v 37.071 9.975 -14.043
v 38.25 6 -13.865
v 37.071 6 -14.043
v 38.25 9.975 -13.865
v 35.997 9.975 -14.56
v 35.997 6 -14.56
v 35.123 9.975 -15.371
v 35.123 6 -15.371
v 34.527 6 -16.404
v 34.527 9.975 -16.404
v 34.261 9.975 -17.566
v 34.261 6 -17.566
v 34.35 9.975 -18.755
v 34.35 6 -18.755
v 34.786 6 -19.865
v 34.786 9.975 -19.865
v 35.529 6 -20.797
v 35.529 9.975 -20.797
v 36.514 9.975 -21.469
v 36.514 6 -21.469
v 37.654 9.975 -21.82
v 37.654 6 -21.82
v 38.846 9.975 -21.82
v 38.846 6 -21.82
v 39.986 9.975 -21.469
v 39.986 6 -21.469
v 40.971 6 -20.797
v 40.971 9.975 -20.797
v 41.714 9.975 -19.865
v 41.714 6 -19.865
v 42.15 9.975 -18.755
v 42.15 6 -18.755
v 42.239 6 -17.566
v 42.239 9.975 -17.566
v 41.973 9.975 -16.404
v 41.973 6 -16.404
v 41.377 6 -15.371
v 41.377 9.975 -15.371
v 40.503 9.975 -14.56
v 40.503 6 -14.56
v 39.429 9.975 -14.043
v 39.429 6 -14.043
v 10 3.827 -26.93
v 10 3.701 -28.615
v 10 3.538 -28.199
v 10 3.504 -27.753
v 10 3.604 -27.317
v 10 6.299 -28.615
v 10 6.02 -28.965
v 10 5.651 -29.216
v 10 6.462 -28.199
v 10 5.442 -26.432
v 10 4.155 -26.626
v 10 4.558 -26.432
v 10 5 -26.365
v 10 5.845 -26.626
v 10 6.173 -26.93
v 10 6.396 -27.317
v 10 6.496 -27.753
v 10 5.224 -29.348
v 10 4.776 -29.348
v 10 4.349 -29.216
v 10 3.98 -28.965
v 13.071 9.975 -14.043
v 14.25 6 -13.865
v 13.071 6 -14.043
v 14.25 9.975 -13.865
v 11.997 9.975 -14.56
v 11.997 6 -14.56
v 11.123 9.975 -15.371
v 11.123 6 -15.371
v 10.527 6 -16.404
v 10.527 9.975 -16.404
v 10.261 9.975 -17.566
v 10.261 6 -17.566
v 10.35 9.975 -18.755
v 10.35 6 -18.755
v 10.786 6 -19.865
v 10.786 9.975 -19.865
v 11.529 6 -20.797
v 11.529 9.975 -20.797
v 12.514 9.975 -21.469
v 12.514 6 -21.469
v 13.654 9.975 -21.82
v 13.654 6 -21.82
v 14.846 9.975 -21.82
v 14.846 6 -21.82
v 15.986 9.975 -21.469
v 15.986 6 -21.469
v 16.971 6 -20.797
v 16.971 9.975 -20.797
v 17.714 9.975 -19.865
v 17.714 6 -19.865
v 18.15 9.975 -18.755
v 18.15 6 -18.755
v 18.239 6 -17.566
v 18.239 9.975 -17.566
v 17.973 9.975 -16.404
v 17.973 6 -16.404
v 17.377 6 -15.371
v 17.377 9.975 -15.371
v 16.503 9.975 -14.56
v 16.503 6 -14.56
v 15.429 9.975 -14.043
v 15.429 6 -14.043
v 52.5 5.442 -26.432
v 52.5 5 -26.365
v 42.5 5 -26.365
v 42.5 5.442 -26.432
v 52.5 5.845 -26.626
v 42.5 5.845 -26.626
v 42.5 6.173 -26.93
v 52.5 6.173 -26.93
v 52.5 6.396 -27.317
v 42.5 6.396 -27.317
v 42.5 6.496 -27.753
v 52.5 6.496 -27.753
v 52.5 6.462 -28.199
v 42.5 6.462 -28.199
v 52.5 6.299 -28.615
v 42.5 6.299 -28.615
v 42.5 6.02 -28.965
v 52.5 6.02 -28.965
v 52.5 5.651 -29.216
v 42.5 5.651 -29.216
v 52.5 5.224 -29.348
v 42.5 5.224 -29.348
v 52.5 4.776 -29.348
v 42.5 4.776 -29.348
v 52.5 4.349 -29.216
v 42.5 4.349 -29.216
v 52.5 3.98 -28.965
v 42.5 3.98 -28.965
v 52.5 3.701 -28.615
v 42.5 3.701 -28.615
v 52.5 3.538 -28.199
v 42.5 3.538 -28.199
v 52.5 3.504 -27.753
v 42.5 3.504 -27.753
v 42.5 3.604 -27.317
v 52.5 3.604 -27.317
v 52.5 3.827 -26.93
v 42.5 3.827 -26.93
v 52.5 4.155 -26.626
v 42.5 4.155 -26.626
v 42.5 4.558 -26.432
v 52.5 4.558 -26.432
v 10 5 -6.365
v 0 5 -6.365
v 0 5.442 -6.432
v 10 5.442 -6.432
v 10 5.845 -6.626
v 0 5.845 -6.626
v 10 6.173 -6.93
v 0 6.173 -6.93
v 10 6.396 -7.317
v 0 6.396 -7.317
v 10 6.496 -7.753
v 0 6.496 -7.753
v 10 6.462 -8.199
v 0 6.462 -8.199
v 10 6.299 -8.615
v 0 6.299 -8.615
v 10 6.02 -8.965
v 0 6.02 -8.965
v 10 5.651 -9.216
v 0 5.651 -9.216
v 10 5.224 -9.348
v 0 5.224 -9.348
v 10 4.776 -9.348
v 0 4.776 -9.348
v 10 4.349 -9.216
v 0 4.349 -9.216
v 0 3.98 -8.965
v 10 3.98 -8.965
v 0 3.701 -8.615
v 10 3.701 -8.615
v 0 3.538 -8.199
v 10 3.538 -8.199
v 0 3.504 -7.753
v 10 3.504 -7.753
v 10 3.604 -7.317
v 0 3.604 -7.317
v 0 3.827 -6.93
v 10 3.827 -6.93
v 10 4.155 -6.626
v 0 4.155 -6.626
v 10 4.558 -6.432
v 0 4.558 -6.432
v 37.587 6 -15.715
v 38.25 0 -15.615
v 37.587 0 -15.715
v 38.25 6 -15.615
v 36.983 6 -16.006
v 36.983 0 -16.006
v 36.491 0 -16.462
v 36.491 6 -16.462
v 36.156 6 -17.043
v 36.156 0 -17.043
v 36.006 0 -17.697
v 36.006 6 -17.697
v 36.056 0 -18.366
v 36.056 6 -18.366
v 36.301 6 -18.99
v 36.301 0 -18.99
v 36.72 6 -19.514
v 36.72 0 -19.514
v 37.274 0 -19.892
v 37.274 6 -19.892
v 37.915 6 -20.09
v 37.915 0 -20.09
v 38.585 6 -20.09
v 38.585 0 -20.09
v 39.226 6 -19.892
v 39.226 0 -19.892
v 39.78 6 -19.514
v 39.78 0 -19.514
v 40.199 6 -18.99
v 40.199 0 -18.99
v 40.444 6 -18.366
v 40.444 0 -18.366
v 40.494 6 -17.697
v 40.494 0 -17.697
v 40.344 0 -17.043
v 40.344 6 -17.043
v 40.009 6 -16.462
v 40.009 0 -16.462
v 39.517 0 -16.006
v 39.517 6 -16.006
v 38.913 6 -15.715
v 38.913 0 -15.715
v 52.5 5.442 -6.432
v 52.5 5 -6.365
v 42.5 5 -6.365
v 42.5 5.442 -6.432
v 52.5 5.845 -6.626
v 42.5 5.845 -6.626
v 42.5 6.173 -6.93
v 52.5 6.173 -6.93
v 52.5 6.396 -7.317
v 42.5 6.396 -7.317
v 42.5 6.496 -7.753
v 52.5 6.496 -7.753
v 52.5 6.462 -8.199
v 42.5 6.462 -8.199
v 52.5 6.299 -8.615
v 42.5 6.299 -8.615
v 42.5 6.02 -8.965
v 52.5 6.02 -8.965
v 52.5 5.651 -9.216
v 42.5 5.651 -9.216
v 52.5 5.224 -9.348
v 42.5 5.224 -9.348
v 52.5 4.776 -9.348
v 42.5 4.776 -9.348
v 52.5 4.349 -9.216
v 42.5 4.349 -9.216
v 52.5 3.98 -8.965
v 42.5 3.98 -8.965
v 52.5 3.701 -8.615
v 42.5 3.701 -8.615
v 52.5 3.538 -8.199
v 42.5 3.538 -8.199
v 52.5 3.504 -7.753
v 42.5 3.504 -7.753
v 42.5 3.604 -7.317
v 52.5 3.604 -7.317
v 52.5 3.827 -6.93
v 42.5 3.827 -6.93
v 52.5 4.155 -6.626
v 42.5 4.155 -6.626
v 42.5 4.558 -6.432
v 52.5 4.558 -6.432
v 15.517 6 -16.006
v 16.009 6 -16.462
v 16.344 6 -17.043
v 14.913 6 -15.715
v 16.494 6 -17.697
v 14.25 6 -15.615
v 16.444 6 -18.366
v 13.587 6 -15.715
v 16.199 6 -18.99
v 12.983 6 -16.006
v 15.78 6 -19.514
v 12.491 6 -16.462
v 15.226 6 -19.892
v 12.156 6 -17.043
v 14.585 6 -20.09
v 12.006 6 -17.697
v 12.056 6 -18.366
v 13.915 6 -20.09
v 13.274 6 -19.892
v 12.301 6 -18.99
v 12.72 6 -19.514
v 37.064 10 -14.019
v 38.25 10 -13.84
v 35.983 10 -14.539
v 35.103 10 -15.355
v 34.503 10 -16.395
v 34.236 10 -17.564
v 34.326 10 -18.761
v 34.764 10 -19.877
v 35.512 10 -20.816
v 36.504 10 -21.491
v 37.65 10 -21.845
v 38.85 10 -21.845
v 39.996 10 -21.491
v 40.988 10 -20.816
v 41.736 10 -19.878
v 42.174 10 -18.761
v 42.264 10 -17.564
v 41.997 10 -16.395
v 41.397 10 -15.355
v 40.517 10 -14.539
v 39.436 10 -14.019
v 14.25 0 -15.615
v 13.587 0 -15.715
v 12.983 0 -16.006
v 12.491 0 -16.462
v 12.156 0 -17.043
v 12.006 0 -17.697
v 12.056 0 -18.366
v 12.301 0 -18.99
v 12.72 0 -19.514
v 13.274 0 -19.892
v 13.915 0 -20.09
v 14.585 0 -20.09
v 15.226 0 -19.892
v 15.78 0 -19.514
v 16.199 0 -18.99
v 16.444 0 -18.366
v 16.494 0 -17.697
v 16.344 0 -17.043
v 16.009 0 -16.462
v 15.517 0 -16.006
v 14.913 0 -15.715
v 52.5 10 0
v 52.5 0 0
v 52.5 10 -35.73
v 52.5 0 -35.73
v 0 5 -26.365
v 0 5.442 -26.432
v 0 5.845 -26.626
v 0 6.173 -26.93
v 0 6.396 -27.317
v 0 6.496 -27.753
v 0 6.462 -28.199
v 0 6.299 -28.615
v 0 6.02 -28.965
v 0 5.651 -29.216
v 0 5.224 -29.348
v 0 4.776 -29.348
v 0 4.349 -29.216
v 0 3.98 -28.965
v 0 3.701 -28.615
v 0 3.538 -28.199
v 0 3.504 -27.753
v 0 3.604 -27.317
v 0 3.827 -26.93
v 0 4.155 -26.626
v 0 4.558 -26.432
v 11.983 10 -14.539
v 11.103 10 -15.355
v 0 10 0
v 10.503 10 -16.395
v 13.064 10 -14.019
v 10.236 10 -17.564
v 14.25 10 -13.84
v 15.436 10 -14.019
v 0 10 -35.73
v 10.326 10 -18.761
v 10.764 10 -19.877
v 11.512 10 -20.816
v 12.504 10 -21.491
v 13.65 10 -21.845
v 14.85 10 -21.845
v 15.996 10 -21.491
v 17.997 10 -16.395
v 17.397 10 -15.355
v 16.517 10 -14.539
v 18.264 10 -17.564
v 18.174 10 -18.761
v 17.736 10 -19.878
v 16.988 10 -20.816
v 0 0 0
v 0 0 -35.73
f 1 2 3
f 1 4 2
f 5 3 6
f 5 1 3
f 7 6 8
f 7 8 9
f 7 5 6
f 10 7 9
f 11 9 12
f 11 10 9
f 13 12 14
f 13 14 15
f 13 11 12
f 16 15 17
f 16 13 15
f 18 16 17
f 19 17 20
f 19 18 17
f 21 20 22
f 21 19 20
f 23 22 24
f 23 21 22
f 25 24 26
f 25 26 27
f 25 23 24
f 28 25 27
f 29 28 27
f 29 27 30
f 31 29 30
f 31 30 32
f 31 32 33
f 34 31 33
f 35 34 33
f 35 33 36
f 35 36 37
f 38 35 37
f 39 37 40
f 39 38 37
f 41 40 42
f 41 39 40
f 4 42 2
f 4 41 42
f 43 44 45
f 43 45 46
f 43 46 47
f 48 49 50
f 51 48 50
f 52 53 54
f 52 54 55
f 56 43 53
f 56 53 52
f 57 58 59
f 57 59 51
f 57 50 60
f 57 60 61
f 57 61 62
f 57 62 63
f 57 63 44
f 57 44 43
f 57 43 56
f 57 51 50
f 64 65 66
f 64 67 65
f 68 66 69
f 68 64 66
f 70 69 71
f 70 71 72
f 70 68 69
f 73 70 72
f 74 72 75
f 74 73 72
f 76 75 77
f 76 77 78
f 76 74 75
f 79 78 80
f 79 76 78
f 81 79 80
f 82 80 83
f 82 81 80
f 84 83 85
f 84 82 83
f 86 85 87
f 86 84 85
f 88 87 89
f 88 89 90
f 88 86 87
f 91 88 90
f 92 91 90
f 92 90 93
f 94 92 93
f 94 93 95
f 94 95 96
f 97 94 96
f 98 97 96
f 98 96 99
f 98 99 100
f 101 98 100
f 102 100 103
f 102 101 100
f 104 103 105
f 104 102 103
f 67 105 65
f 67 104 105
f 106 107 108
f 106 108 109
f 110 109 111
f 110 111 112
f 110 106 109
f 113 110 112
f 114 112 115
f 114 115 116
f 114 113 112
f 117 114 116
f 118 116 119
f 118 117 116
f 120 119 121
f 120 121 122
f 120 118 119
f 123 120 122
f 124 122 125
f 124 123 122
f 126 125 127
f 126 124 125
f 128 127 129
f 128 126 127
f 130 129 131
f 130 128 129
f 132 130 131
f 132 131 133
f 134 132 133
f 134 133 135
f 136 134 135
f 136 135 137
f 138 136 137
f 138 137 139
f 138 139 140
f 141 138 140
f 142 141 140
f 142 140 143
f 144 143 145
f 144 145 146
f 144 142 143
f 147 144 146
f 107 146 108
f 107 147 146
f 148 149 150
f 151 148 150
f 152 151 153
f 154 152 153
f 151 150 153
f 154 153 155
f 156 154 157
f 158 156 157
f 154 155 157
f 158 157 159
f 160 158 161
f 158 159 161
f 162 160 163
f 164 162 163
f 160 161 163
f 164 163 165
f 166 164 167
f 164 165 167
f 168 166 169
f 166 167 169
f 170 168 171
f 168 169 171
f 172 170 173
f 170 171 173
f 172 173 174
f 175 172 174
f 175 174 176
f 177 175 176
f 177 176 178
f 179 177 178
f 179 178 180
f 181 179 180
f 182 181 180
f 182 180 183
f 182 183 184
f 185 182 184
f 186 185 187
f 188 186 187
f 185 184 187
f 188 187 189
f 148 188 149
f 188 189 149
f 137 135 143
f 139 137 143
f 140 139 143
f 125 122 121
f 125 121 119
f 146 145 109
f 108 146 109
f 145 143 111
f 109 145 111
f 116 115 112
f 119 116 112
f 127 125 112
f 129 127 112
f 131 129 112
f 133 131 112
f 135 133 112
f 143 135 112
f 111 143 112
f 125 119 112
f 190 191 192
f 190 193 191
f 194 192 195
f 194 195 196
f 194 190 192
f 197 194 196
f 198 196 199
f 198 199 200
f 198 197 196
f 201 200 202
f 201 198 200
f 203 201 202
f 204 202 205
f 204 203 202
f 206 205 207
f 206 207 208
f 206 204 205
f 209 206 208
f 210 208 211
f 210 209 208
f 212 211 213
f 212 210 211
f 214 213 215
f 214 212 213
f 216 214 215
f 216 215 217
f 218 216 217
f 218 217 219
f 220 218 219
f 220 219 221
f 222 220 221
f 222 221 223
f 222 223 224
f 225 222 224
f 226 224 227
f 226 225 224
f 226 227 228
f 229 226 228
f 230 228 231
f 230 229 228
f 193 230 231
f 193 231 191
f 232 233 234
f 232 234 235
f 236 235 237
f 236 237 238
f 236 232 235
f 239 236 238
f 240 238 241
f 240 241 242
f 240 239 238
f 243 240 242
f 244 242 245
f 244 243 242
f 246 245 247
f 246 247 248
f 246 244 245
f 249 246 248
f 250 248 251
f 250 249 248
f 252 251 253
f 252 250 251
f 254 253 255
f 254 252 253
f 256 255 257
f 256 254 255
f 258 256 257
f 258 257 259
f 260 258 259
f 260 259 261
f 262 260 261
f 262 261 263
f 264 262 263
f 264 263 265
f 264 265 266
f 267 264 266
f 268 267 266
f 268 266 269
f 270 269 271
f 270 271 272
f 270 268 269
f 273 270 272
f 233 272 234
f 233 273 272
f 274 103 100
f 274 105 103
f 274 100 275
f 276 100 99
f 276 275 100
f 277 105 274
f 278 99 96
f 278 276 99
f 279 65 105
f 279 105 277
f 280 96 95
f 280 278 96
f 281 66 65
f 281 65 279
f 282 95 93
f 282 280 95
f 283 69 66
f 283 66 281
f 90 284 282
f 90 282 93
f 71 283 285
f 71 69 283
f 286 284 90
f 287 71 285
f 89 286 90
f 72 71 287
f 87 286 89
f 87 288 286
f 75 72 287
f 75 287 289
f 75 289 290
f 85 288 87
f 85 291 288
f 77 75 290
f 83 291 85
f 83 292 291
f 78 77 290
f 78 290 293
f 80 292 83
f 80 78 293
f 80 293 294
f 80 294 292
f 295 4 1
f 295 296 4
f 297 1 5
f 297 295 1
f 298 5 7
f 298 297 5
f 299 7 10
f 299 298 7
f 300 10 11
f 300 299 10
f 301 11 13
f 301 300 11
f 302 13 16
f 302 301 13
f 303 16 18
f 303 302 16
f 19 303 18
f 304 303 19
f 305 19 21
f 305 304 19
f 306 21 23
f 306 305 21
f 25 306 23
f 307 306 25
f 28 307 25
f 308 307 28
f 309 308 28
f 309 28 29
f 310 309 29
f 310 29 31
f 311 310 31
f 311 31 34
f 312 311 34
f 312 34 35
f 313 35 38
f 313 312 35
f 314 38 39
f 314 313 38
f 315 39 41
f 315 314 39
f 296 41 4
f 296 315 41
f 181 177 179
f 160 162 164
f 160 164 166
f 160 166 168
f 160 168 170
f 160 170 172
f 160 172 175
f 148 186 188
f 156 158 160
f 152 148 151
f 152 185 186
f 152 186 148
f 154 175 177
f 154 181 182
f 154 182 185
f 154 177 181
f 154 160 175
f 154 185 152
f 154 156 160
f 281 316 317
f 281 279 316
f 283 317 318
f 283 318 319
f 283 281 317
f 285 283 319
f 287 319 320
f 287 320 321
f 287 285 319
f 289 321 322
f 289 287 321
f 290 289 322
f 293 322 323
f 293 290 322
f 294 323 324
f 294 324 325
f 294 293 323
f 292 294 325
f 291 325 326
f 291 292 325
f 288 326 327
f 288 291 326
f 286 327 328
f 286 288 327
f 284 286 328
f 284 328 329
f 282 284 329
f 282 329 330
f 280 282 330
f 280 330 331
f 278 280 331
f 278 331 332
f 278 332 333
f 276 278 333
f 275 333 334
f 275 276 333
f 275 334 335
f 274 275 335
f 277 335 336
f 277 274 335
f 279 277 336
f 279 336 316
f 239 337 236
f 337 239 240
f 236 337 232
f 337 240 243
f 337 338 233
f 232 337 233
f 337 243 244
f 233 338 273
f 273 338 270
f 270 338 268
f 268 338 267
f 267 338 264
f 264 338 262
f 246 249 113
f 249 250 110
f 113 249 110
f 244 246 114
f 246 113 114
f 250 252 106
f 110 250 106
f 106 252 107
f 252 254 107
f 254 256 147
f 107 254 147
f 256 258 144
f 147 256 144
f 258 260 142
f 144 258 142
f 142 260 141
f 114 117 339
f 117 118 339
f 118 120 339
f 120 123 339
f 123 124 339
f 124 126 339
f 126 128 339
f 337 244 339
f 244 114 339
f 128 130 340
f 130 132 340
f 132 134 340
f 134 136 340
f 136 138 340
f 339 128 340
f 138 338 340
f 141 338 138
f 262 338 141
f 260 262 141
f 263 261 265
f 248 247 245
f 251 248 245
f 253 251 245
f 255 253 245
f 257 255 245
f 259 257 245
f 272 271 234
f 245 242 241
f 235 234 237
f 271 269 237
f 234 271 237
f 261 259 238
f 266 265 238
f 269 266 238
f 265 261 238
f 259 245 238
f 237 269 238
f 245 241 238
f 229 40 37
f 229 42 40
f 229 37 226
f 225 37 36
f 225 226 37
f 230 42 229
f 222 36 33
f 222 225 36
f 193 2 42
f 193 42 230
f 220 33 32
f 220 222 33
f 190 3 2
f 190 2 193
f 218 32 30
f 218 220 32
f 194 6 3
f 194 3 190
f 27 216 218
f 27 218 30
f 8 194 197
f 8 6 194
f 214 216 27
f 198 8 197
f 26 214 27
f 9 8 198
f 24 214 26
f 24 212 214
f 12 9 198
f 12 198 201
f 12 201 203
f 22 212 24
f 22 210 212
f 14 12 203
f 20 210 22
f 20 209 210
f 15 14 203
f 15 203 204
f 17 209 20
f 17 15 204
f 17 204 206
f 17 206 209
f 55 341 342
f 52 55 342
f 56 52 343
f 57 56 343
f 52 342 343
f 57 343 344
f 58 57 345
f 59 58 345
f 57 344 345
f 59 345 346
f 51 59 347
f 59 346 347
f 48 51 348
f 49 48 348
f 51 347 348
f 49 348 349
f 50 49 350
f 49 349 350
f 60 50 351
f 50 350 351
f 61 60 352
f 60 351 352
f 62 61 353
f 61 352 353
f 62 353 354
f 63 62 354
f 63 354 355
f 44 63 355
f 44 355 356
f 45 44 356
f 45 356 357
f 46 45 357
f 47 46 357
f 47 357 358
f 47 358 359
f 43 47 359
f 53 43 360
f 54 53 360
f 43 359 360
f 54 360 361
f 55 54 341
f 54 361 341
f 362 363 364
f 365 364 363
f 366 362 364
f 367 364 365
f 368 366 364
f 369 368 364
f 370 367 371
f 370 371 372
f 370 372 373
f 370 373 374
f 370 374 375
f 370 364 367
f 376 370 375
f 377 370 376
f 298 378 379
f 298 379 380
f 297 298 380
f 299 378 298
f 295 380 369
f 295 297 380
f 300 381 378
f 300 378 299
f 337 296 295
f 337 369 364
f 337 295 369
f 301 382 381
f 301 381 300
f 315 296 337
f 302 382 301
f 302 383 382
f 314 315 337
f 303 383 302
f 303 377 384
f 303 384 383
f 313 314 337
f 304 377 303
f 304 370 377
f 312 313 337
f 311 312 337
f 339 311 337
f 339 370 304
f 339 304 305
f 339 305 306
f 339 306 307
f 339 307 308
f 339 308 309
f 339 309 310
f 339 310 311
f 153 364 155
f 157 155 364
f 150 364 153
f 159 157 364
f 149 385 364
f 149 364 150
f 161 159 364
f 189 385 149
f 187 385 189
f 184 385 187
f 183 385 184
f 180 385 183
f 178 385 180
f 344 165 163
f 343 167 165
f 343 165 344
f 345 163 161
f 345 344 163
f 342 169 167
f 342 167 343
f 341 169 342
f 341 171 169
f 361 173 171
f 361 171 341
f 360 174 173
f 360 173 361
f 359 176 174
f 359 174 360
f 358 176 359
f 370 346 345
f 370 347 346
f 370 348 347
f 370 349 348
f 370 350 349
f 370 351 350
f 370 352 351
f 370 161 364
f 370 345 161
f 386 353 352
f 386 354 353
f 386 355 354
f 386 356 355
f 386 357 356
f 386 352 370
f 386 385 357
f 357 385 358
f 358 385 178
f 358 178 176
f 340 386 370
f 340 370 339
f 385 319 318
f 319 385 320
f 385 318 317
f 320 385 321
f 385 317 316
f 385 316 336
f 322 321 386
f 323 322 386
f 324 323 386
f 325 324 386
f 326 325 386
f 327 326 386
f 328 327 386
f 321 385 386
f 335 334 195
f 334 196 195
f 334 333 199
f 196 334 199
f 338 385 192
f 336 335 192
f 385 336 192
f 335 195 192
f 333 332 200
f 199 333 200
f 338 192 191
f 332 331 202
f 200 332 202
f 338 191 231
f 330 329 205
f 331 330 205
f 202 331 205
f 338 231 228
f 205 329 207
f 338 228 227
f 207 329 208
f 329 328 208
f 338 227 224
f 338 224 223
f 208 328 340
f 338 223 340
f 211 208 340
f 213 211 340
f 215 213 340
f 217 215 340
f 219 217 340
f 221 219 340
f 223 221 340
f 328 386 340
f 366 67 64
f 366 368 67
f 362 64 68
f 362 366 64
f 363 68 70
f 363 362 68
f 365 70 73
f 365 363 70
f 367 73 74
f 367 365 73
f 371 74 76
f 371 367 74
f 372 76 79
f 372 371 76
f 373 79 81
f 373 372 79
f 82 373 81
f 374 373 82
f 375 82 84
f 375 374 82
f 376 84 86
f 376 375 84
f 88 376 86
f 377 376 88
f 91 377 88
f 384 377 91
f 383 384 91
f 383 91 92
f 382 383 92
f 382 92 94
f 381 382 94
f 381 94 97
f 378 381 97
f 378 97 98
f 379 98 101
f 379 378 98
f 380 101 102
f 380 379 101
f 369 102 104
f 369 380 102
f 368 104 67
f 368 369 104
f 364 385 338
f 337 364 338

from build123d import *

# Parameters (mm, degrees)
SKETCH1_W                     = 52.5
SKETCH1_H                     = 35.73
BOSS_EXTRUDE1_DEPTH           = 10
SKETCH3_R                     = 1.5
CUT_EXTRUDE1_DEPTH            = 10
CBORE_FOR_M4_SHCS1_AT_2_COUNT = 2
CBORE_FOR_M4_SHCS1_AT_2_PITCH = 24


with BuildPart() as part:
    # Sketch1 → Boss-Extrude1 (new body)
    with BuildSketch(Plane(origin=(0, 0, 0), x_dir=(1, 0, 0), z_dir=(0, 1, 0))):
        with Locations((26.25, 17.865)):
            Rectangle(SKETCH1_W, SKETCH1_H)
    extrude(amount=BOSS_EXTRUDE1_DEPTH)

    # Sketch3 → Cut-Extrude1 (cut)
    with BuildSketch(Plane.ZY):
        with Locations((-27.865, 5)):
            Circle(SKETCH3_R)
        with Locations((-7.865, 5)):
            Circle(SKETCH3_R)
    cut_extrude1 = extrude(amount=-CUT_EXTRUDE1_DEPTH, mode=Mode.SUBTRACT)

    # Mirror1: Cut-Extrude1 across plane
    add(cut_extrude1.mirror(Plane(origin=(26.25, 0, 0), x_dir=(0, 0, 1), z_dir=(1, 0, 0))), mode=Mode.SUBTRACT)

    # Sketch6 → CBORE for M4 SHCS1 (revolve, cut)
    with BuildSketch(Plane(origin=(38.25, 10, -17.865), x_dir=(0, 0, 1), z_dir=(1, 0, 0))):
        Polygon((0, 0), (0, 10), (2.25, 10), (2.25, 4), (4, 4), (4, 0.025), (4.025, 0), align=None)
    cbore_for_m4_shcs1 = revolve(axis=Axis((38.25, 16.35, -17.865), (0, -1, 0)), mode=Mode.SUBTRACT)

    # CBORE for M4 SHCS1 at 2: CBORE for M4 SHCS1 ×2
    with Locations(*[(-i * CBORE_FOR_M4_SHCS1_AT_2_PITCH, 0, 0) for i in range(1, CBORE_FOR_M4_SHCS1_AT_2_COUNT)]):
        add(cbore_for_m4_shcs1, mode=Mode.SUBTRACT)


solid = part.part
